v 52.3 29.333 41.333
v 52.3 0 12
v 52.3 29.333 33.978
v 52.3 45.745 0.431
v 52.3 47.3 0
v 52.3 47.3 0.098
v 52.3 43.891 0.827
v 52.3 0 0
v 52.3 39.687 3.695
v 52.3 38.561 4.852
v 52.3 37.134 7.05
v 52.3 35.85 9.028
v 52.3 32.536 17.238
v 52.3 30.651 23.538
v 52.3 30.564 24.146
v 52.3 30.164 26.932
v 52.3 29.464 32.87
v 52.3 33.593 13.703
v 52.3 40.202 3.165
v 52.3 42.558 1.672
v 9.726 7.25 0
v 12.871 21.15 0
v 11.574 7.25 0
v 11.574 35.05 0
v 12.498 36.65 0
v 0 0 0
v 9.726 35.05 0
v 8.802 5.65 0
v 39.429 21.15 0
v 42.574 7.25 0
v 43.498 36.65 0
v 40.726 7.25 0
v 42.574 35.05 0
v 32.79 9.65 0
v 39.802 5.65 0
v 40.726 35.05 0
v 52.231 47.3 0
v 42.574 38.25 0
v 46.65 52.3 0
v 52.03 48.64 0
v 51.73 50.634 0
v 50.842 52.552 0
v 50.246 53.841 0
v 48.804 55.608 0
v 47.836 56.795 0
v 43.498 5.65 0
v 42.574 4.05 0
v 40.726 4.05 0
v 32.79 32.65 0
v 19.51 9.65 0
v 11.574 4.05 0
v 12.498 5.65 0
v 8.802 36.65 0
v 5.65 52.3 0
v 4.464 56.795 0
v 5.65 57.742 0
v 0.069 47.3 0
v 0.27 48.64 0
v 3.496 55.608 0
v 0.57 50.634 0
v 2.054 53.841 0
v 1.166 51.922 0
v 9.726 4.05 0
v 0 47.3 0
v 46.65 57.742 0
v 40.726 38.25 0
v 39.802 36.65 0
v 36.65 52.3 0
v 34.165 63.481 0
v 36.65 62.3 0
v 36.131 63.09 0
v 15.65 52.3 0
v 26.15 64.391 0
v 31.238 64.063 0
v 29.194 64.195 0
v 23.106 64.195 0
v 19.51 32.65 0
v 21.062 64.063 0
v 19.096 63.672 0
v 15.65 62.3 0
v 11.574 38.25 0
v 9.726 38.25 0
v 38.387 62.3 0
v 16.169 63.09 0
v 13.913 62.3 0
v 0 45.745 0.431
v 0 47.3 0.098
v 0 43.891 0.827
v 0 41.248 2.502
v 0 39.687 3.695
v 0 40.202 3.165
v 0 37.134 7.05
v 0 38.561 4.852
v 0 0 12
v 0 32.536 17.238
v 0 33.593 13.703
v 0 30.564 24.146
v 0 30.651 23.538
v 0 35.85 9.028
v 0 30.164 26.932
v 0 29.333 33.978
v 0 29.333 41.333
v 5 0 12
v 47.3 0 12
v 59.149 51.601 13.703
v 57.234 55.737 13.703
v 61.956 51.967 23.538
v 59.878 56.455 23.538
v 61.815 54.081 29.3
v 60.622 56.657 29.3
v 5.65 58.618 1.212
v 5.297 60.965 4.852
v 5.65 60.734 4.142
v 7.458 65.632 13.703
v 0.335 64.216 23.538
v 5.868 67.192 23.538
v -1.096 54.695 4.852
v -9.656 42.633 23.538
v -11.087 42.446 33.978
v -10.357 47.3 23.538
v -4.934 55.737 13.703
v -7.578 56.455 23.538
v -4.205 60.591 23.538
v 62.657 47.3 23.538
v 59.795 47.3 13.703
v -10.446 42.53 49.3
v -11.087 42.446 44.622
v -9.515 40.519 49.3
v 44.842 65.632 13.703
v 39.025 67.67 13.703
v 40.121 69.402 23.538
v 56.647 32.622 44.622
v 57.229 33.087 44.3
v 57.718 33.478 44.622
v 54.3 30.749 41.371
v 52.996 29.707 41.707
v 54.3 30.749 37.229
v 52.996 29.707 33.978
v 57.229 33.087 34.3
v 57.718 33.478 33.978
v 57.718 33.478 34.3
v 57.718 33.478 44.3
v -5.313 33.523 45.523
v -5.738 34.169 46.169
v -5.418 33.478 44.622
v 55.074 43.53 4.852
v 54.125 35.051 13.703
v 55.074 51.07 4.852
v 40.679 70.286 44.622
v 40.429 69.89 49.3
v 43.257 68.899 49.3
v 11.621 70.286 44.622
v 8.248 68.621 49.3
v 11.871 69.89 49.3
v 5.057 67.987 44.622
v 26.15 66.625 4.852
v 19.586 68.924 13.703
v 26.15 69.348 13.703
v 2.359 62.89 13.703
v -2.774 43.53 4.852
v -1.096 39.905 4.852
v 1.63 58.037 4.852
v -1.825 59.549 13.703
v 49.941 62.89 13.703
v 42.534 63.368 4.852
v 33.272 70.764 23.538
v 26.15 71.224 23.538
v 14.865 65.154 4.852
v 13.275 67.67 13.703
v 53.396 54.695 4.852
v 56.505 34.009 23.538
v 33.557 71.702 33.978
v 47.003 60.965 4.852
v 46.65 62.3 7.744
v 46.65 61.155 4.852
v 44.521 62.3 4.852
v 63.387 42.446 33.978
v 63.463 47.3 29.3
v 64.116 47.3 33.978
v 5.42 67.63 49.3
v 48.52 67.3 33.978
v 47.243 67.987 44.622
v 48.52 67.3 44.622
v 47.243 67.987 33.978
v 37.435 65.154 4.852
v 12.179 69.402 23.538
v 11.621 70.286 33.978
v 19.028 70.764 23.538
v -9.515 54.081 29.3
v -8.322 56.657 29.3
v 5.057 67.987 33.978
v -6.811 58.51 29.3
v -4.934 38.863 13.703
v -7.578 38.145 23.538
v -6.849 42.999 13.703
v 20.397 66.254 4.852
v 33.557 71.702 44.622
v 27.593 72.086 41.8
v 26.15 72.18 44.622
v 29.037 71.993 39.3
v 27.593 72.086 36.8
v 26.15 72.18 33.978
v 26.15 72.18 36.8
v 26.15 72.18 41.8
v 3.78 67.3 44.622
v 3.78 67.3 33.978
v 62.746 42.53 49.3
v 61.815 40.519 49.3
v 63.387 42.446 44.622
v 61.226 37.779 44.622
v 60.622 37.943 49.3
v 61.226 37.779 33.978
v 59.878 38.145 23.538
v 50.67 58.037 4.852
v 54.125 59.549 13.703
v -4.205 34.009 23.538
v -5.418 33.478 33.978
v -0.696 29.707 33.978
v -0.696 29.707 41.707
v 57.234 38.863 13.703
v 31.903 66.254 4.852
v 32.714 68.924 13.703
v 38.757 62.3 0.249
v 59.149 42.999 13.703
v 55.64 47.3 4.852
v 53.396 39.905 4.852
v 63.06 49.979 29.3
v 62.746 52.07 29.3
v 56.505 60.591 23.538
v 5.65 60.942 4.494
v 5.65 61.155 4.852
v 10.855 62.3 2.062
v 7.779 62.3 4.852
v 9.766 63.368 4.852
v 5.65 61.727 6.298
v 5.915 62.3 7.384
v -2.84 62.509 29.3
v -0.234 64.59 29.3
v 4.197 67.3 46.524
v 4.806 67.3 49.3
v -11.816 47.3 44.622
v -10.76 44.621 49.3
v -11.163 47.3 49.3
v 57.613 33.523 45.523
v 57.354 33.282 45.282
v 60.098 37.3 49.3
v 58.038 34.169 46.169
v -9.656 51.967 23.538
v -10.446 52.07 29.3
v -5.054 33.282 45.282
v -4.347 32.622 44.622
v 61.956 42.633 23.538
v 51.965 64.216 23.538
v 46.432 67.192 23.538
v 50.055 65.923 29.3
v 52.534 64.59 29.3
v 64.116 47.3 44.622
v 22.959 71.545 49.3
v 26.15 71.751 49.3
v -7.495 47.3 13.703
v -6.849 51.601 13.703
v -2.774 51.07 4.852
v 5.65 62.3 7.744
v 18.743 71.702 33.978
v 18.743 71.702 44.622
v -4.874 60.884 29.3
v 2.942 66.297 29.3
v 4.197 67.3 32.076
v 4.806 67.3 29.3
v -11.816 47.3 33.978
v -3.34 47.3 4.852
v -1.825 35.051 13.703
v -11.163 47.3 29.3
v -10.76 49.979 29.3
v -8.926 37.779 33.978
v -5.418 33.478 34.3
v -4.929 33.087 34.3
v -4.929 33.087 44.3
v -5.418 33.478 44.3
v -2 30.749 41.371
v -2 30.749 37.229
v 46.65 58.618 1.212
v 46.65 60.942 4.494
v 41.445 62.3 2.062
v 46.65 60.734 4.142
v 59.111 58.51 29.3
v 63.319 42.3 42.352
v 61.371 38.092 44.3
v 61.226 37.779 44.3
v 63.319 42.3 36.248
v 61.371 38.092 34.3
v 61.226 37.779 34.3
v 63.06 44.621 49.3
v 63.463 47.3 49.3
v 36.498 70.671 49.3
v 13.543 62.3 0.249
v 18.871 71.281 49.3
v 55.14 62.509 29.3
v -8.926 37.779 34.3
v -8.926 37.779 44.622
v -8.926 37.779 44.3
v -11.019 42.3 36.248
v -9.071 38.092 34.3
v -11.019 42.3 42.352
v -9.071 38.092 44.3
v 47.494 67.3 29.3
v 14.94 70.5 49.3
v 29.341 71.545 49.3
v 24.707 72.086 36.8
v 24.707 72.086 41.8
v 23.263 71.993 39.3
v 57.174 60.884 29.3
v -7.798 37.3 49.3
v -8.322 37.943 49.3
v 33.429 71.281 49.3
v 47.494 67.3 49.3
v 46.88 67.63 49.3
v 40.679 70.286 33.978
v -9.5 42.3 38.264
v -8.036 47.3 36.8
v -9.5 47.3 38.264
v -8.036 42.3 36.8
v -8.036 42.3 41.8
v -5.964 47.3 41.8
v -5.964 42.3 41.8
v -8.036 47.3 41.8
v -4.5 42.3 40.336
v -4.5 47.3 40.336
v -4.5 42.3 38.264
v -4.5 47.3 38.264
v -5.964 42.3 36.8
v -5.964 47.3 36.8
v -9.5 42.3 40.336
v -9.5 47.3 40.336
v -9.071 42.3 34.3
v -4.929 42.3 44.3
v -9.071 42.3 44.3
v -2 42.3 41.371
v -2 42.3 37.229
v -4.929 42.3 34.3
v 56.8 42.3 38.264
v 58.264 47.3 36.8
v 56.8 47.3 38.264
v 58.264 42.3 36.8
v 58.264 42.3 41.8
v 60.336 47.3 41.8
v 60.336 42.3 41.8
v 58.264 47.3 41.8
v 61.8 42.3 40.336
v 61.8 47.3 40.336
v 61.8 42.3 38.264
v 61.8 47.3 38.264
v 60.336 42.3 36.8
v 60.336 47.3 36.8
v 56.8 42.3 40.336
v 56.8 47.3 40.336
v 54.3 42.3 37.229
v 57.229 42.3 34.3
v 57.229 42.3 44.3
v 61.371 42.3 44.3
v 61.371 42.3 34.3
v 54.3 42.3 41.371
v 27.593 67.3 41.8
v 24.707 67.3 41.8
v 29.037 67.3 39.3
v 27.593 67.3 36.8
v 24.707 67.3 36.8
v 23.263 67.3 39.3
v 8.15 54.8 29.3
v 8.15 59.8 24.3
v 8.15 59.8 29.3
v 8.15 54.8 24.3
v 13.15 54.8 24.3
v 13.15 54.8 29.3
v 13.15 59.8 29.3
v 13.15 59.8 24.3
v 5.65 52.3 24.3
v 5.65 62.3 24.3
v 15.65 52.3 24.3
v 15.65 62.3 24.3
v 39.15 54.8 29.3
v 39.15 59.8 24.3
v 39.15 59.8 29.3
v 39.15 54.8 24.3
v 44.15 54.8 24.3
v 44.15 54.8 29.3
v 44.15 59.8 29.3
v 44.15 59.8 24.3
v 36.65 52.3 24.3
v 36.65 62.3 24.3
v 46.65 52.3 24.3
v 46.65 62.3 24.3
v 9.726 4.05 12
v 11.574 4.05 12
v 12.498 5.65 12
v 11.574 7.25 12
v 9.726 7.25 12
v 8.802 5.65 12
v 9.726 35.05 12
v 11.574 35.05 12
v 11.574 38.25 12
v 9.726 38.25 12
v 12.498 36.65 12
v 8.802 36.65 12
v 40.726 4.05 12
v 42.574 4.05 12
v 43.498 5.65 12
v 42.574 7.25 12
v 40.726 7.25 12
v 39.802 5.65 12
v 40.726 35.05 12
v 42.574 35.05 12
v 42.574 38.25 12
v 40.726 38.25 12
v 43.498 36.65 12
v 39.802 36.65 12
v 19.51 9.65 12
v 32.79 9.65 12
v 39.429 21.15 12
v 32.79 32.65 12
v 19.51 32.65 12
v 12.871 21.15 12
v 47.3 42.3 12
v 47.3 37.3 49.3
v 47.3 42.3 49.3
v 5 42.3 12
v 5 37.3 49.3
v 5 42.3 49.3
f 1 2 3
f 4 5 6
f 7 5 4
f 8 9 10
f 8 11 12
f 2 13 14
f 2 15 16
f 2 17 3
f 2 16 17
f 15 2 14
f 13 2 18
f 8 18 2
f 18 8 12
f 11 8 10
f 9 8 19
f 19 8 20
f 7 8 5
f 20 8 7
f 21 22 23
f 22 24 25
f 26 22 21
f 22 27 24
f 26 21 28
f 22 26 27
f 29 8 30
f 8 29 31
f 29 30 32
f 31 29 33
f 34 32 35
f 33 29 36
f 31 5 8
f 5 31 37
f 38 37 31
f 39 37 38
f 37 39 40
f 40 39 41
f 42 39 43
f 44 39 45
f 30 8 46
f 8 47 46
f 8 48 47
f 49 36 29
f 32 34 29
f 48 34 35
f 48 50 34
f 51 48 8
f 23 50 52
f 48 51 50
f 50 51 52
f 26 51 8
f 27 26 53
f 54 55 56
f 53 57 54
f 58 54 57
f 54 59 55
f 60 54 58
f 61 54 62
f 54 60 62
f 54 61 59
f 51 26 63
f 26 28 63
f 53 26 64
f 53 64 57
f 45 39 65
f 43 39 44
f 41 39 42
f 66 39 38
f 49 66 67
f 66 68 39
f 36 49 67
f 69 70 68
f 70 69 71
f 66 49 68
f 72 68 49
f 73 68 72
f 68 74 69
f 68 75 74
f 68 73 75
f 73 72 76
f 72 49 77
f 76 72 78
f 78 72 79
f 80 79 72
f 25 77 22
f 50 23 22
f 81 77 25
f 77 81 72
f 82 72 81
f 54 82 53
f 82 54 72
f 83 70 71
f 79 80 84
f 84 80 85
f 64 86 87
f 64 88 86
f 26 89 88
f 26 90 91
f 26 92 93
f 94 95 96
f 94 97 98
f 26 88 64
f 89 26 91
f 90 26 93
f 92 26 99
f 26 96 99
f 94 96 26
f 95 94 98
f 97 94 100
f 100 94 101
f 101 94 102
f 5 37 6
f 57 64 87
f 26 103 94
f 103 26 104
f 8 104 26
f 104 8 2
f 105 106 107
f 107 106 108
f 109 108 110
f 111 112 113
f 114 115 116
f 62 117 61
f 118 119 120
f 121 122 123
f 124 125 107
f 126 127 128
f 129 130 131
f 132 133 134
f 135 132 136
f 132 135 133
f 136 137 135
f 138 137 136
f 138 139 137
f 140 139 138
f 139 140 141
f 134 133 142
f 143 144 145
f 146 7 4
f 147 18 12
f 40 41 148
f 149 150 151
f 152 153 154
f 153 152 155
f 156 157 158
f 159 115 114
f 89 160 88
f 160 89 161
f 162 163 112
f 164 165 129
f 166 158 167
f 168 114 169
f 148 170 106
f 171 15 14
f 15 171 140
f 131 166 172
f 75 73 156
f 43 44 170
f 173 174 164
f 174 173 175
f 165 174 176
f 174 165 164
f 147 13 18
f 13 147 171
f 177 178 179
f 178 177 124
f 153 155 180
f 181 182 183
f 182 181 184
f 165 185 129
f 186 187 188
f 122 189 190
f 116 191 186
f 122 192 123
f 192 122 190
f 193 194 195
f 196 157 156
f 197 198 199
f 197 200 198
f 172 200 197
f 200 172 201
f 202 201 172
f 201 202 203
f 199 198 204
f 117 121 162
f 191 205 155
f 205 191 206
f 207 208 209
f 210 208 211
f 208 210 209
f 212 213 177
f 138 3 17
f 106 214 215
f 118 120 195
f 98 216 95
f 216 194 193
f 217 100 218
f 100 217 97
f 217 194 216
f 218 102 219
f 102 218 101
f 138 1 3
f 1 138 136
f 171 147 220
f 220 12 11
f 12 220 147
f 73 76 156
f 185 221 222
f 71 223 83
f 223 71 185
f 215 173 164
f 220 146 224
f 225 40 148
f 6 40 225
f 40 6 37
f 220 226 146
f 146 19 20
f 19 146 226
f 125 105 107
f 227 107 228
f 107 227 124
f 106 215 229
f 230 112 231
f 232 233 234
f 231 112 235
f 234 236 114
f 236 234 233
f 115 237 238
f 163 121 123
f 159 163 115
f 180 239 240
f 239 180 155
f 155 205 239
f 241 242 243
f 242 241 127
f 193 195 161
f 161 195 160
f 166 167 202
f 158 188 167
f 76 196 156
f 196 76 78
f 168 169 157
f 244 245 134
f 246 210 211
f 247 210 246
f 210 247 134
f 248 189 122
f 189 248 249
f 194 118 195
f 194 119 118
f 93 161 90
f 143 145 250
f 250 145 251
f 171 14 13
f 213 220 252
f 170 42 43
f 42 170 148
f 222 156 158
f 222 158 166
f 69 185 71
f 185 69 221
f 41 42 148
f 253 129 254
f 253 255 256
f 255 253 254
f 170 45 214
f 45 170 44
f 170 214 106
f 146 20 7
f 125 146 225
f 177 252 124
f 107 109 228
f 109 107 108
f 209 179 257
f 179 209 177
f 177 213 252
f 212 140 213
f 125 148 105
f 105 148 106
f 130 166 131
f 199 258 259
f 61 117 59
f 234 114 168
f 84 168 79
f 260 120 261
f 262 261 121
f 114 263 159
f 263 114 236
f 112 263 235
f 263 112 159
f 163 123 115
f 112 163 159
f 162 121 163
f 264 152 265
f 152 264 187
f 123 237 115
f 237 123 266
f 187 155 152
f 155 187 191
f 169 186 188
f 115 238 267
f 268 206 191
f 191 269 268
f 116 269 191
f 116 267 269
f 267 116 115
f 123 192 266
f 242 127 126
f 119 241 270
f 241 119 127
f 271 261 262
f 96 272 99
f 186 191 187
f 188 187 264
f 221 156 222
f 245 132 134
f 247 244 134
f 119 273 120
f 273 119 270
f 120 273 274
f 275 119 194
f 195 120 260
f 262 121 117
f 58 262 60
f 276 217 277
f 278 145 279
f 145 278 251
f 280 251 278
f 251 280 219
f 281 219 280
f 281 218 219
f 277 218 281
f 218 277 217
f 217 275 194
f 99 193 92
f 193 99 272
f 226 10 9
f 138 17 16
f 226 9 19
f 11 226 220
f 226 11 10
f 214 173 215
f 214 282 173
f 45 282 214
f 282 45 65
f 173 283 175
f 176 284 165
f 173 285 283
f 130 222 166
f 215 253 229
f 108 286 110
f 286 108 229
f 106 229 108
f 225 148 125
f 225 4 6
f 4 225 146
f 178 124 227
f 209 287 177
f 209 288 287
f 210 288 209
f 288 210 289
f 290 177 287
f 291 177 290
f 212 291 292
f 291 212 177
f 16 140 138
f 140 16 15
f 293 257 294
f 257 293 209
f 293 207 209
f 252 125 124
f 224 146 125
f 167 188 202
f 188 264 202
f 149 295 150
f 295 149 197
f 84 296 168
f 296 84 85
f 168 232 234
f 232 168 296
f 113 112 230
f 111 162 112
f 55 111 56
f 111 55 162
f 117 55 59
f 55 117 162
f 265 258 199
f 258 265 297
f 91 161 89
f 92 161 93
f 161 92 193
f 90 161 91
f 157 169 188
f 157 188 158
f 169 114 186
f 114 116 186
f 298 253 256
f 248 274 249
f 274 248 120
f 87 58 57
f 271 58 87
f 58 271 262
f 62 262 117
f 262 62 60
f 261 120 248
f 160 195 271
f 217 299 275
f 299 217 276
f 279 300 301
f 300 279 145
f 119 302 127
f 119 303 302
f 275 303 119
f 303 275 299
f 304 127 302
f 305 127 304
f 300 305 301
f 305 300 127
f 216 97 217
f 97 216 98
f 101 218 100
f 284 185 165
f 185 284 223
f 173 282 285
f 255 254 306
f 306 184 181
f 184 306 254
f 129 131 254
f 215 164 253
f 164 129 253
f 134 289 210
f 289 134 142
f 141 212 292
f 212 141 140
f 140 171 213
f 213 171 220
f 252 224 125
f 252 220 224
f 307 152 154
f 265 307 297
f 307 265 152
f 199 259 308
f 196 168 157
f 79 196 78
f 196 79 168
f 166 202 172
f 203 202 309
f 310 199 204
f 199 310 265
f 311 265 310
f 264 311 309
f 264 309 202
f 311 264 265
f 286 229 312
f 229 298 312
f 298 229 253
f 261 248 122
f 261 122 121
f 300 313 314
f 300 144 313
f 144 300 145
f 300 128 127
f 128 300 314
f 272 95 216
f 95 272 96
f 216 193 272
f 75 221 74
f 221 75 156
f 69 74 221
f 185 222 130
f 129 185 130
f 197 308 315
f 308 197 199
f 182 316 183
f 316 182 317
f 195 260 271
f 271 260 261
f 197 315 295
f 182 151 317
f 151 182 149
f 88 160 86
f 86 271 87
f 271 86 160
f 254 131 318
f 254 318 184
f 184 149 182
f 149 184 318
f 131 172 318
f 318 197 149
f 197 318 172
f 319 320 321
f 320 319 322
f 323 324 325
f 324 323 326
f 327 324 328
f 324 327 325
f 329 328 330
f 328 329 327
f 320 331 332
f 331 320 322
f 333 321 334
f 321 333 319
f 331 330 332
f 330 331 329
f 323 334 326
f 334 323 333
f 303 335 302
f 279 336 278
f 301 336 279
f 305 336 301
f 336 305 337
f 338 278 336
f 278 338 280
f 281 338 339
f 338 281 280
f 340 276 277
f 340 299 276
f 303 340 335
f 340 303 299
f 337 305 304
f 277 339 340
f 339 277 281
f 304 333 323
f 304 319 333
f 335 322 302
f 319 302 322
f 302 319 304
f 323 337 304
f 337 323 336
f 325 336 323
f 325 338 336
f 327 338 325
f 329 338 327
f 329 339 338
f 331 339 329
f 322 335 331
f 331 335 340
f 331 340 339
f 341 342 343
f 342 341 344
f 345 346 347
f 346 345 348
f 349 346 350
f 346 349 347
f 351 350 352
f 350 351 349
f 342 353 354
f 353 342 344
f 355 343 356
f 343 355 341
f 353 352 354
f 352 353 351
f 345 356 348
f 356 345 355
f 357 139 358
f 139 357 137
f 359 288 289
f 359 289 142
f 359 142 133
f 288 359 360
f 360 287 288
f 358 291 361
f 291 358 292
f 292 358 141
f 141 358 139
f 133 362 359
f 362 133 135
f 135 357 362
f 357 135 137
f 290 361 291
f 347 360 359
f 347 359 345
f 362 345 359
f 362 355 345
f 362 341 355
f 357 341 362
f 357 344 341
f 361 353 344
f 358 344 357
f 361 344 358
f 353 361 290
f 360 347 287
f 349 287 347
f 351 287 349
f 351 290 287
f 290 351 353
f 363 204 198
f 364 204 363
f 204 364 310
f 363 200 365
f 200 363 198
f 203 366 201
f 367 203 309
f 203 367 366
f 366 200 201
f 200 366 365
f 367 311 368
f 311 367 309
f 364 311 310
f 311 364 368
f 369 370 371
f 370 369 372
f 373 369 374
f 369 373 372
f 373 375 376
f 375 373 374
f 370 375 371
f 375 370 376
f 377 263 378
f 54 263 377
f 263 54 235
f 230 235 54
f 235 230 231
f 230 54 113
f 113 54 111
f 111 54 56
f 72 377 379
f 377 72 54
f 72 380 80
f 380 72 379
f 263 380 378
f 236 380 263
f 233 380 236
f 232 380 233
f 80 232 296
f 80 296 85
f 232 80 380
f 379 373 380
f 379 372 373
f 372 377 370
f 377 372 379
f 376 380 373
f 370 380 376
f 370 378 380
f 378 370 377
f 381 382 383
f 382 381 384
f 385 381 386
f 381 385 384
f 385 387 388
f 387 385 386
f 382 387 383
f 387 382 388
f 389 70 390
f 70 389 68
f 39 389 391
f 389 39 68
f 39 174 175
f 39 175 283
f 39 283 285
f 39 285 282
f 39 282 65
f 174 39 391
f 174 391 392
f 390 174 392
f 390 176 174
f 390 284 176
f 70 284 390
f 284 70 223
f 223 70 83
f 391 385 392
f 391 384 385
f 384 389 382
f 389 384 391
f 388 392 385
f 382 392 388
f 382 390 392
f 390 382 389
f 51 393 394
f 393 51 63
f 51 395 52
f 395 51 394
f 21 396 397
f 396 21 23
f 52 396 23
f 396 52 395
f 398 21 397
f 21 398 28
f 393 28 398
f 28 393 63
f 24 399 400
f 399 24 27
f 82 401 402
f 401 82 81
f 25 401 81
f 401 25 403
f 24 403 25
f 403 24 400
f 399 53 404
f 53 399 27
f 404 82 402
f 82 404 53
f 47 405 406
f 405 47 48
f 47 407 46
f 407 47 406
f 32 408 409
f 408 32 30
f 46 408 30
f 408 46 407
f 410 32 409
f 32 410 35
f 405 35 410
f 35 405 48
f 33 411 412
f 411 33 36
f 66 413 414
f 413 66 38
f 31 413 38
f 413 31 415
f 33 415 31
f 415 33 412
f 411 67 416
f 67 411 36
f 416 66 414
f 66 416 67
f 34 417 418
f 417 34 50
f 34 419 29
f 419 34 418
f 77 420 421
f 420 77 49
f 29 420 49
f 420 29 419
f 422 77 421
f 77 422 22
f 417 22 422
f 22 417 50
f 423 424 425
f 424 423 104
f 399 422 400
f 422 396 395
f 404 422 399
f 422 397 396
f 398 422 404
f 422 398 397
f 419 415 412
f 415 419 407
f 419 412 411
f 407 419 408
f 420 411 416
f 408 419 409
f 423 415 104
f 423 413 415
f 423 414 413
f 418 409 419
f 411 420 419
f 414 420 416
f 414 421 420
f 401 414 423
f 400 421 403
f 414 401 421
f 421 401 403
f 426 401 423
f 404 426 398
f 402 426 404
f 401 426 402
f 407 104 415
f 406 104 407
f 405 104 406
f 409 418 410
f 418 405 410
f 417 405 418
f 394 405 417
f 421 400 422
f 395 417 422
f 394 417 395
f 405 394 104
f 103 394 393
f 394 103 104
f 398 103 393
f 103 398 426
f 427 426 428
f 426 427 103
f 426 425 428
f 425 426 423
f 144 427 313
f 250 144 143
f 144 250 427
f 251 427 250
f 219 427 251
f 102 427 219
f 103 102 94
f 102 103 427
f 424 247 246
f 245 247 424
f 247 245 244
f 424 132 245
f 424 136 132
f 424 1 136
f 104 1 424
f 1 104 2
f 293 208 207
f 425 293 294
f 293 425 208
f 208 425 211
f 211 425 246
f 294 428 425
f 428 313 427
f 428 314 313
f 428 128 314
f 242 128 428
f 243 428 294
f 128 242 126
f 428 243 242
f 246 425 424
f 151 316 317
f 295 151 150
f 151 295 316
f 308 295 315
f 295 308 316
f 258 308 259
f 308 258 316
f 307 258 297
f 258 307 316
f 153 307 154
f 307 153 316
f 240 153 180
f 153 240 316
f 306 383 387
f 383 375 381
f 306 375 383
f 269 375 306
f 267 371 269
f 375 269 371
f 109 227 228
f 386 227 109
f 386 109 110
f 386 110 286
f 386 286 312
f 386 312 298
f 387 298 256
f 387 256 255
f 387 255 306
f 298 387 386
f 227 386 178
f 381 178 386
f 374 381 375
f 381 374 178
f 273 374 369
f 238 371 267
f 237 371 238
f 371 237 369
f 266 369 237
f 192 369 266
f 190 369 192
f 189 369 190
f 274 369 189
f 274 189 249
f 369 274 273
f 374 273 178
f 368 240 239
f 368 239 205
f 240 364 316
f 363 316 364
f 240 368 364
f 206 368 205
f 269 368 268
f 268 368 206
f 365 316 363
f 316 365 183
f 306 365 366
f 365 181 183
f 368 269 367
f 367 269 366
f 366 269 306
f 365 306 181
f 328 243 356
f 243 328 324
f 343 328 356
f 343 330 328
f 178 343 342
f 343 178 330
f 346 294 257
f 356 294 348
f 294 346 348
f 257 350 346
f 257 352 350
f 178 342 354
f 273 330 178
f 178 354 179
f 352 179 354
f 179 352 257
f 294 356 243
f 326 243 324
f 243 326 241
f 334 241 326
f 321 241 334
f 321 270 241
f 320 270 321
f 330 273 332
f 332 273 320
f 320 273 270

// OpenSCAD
// file: vars.scad
// Variables used throughout design.
// Yes, these could use some commenting.
// (c) 2014, Christopher "ScribbleJ" Jansen

// Printer outside dimensions are actually this + corner_thick*2.
printer_w = 400;
printer_l = 400;
printer_h = 400;

// Used wherever I need something arbitrarily large.
huge=500;

// 608 Bearings
//Added some extra space to the bearing retainer so I don't break them during assembly
bearing_w = 7*1.01;  
bearing_d = 22*1.01;
bearing_r = bearing_d/2;
bearing_hole_d = 8;
bearing_hole_r = bearing_hole_d/2;

// Miscellaneous bolts, M3
misc_bolt_d = 3.2;
misc_bolt_r = misc_bolt_d/2;
misc_nut_r  = misc_bolt_d;
misc_bolt_pitch = 0.5;
misc_bolthead_d = misc_bolt_d*2;
misc_bolthead_r = misc_bolthead_d/2;

//Retainer for using a regular bolt (M8) instead of a proper leadscrew as the Z lift nut.
liftNut_d = 8;
liftNut_od = liftNut_d *2;
liftNut_h = liftNut_d * 0.8;
liftNutRetainer_h = liftNut_h ;

// Bearing retainers
//Added some extra thickness to the bearing retainer so I don't break them during assembly
retainer_shell_thick = 0.6;
retainer_shell_sep   = 0.25;
retainer_lip_thick   = 2;
retainer_inner_width = 1;

// GT2, 2mm belting
belt_w    = 6;
belt_thick= 2;
belt_sep  = retainer_lip_thick*2 + 2;

// Some calculated info about the bearing retainers.
calc_retainer_h  = retainer_lip_thick*2 + belt_w;
calc_retainer_ir = bearing_r + retainer_shell_thick*2 + retainer_shell_sep;
calc_retainer_or = calc_retainer_ir + belt_thick;
calc_retainer_b_off = retainer_lip_thick - (bearing_w-belt_w)/2;

// 20mm Tslot and associated bolt dimensions
tslot_w = 20;
tslot_bolt_d = 5;
tslot_bolt_r = tslot_bolt_d/2;
tslot_bolt_l = 4;
tslot_bolthead_d = 10;
tslot_bolthead_r = tslot_bolthead_d/2;

// This variable is called corner_thick, but it's used pretty much everywhere something needs to be sturdy but thin, not
// just on the corners.
// TODO: Anywhere it's used that's not a corner, I should make a new variable for that thing.
corner_thick = 5;
corner_length = tslot_w*3;

// 8mm Smooth Rod dimensions
rod_d=8;
rod_r=rod_d/2;

// Named because they were originally bronze bushings, now expects to be LM8UU.
bushing_d=15;
bushing_r=bushing_d/2;
bushing_l=10;
bushing_flange_r = bushing_r+3;
bushing_flange_w = 1;
bushing_material_thick = 5;

// X Axis dimensions
x_rod_sep = 50;
x_carriage_l = 50;
x_mount_sep_x = x_carriage_l - misc_bolthead_r*2*2 - misc_bolt_r*2;
x_mount_offset = bushing_r + misc_bolt_r * 2;
belt_above_x = bushing_r+misc_nut_r*2;
belt_clamp_w = 7;
x_rod_past_bearing = 20;

// Y Axis dimensions
belt_above_y = 45;
y_above_x = belt_above_x-belt_above_y;


// The standoffs for the belt idler bearings.
bearing_mount_base = corner_thick;
bearing_mount_extra = 2;
belt_above_bearing_mount = bearing_mount_base + bearing_mount_extra + retainer_lip_thick;
bearing_mount_support_tweak = 30;
y_bearing_offset = bushing_r+bushing_material_thick-calc_retainer_ir;
y_bearing_sep_y = calc_retainer_ir*2+belt_thick;
y_bearing_sep_z = belt_w+belt_sep;
bearing_bolt_r  = 4;
bearing_bolt_pitch = 1.25;
bearing_bolt_holder_thick = 4;

// Gap between Y carriage and T-slot
y_carriage_from_tslot = 2;

// 50mm Y-carriage length fits 2 LM8UU
y_carriage_len = 50;

// NEMA17 Motor Dimensions
motor_w = 42.3;
motor_h = motor_w;
motor_bolt_sep = 31.0;
motor_bolt_r   = 1.5;
// Dimensions of pulleys on X/Y Motors
motor_pulley_d = 10;
motor_pulley_r = motor_pulley_d/2;
motor_pulley_h = 5.3;  // This is the distance the pulley is above the motor body, not the height of the pulley itself.
motor_flange_d = 23;
motor_flange_r = motor_flange_d/2;
// This creates an extra hole in the motor corner for T-slot mounting, because the spaces for the motor mounts may coincide 
// with one of the standard holes.
motor_corner_extra_hole_pos = tslot_bolt_r+3;

// Some useful precalculated values
calc_corner_from_y_rod = x_rod_past_bearing+corner_thick+y_carriage_from_tslot+tslot_w;
calc_corner_above_x = belt_above_x - belt_above_bearing_mount + bearing_mount_base;
calc_motor1_above_x  = belt_above_x - motor_pulley_h;
calc_motor2_above_x  = belt_above_x - motor_pulley_h + belt_w + belt_sep;
calc_motor_from_y_rod = -bushing_r - bushing_material_thick + bearing_bolt_holder_thick + bearing_bolt_r + calc_retainer_or + motor_pulley_r;

// Motor bracket thick is 12 because I'm using M3x16 to mount the motors and the bolts can fit about 4mm into a NEMA17.
motor_bracket_thick = 12;
motor_bracket_wide = (motor_w - motor_flange_d) / 2;
motor_bracket_len  = motor_w;
motor_bolt_offset  = (motor_w - motor_bolt_sep) / 2;

// How far apart the Z smooth rods should be
z_rod_sep = 150;
z_motor_off = motor_h - tslot_w - corner_thick;

// Very important to set this for your lasercut Z, the thickness of the material you are lasering.
laser_mat_thick = 4.75;
// Laser mat margin is how much material is required outside of a tabslot.
laser_mat_margin = laser_mat_thick;
// Distance between heated bed holes, 209 is standard for a reprap heated bed
bed_mount_sep   = 209;
// Bed mounting holes will be created centered on the Z platform, and another set offset at this distance from the smooth rod:
bed_from_z      = 60;
// bed_box_r and bed_box_h here will exactly fir the lm8uu holders.  Decrease at your own peril.
bed_box_r       = 25;
bed_box_h       = 50;
z_ends_sep = printer_l - tslot_w*2 - corner_thick*2 - motor_w;
platform_l      =  laser_mat_margin*2 + laser_mat_thick*2 + bed_box_r*2 + z_ends_sep;
platform_w      = bed_mount_sep + misc_bolt_r*2 + laser_mat_margin*2;
// These settings for the leadscrew fit the leadscrews sold by MakersToolWorks
z_leadscrew_passthrough_r = 12/2;
leadscrew_bolt_offset = 22/2;
leadscrew_bolt_r = 3.2/2;
laser_bushing_fudge = 0.1; // No longer used since the change to lm8uu


// LM8UU bearing dimensions
lm8uu_d=15;
lm8uu_r=lm8uu_d/2;
lm8uu_l=24;
// The nut and bolt here refer to the ones used in the Z axis' four LM8UU holders.
lm8uu_bolt_r=5/2;
lm8uu_nut_r=10/2;

arduino_width=60;
// file: common.scad
// Common functions used in various places throughout.
// (c) 2014, Christopher "ScribbleJ" Jansen
include <vars.scad>

// Reduce radius of holes intended to hold bolts by threads.
// 0.86603 * p = nominal depth of threads.  1/3-1/2 of that is about right.
function smallhole(r,p) = r - ((p*0.86603)/3);

// Polyhole derived from Nophead's Polyhole work: http://hydraraptor.blogspot.com/2011/02/polyholes.html
module polyhole(r,h,v=6,a=0)
{
  rotate([0,0,a]) cylinder( h = h, r = r  / cos( 180 / v ), $fn = v );
}
// 2D version of Polyhole
module polycircle(r,v=6,a=0)
{
  rotate([0,0,a]) circle(r = r  / cos( 180 / v ), $fn = v );
}
// Cutout for bolthole
module bolt(bolt_r = misc_bolt_r,bolthead_r = misc_bolthead_r,bolt_len = huge,v=6,a=0)
{
  translate([0,0,-bolt_len]) polyhole(r=bolt_r,h=bolt_len+1,v=v,a=a);
  polyhole(r=bolthead_r,h=huge,v=v,a=a);
}
// 2D ring
module ring(inner=5,outer=10,v=32)
{
  difference()
  {
    circle(r=outer);
    polycircle(r=inner,v=v);
  }
} 
// 2D Rounded square
module roundsquare(dim=[50,50],r=5)
{
  translate([0,r]) square([dim[0], dim[1] - r*2]);
  translate([r,0]) square([dim[0] - r*2, dim[1]]);
  for(x=[r,dim[0]-r])
  for(y=[r,dim[1]-r])
    translate([x,y]) circle(r=r);
}
// Lasercutting Tabs
module maketabs(l=100,w=5,num=10)
{
  tablength=l/(num * 2);
  for(x=[tablength/2:tablength*2:l])
    translate([x,0]) square([tablength,w]);
}
// Support for printing bearing mount
module support(l=bearing_mount_base+bearing_mount_extra+y_bearing_sep_z+calc_retainer_b_off,w=bearing_hole_d * tan(180/6) *2,extra=0,extra_l=0)
{
  translate([-w/2,0,-l]) 
  {
    difference()
    {
      rotate([45,0,0]) cube([w,huge/2,huge/2]);
      translate([-huge/2,0,0]) cube([huge,huge,huge]);
      translate([-huge/2,-huge/2,l]) cube([huge,huge,huge]);
    }
    translate([0,-extra,-extra_l/2]) cube([w,extra,extra_l]);
  }

}
// main file
// Z motor mount
// Print 2
// (c) 2014, Christopher "ScribbleJ" Jansen
include <common.scad>
use <platform.scad>


z_motor_mount();

module z_motor_mount()
{

  difference()
  {
    union()
    {
      // Basic Bracket
      cube([motor_w + corner_thick*2, motor_w+corner_thick, motor_h+motor_bracket_thick]);
      // ORB
      translate([motor_w/2+corner_thick,motor_w+corner_thick,motor_h+motor_bracket_thick-tslot_w/2-corner_thick]) scale([motor_w+corner_thick*2+tslot_bolthead_r*4+4,(tslot_w+corner_thick)*2,(motor_h+motor_bracket_thick)*2]) sphere(r=.5,$fn=32);
    }

    // Motor Cutout
    translate([corner_thick,-1,motor_bracket_thick]) cube([motor_w,motor_w+1,motor_h+1]);
    // Angle
    translate([-huge/2,0,motor_bracket_thick]) rotate([45,0,0]) cube([huge,huge,huge]);

    // T-slot bolt holes
    // front
    translate([-tslot_bolthead_r-2,motor_w,motor_h+motor_bracket_thick-corner_thick-tslot_w/2])rotate([90,0,0]) bolt(bolt_r=tslot_bolt_r,bolthead_r=tslot_bolthead_r,v=8,a=360/16); 
    translate([motor_w+corner_thick*2+tslot_bolthead_r+2,motor_w,motor_h+motor_bracket_thick-corner_thick-tslot_w/2])rotate([90,0,0]) bolt(bolt_r=tslot_bolt_r,bolthead_r=tslot_bolthead_r,v=8,a=360/16); 
    // back
    translate([motor_w/2+corner_thick,motor_w+corner_thick*2+tslot_w,motor_h+motor_bracket_thick-corner_thick-tslot_w/2]) rotate([-90,0,0]) bolt(bolt_r=tslot_bolt_r,bolthead_r=tslot_bolthead_r,bolt_len=10); 
    // top
    translate([motor_w/2+corner_thick-motor_bolt_sep/2,motor_w+corner_thick+tslot_w/2,motor_h+motor_bracket_thick-corner_thick*2-tslot_w]) rotate([180,0,0]) bolt(bolt_r=tslot_bolt_r,bolthead_r=tslot_bolthead_r,v=4,a=360/8);
    translate([motor_w/2+corner_thick+motor_bolt_sep/2,motor_w+corner_thick+tslot_w/2,motor_h+motor_bracket_thick-corner_thick*2-tslot_w]) rotate([180,0,0]) bolt(bolt_r=tslot_bolt_r,bolthead_r=tslot_bolthead_r,v=4,a=360/8);

    // motor shaft and bolt holes
    translate([corner_thick + motor_w/2,motor_w/2,-1])
    {
      polyhole(r=motor_flange_r,h=huge);
      for(x=[-motor_bolt_sep/2,motor_bolt_sep/2])
      for(y=[-motor_bolt_sep/2,motor_bolt_sep/2])
      {
        translate([x,y,0]) polyhole(r=misc_bolt_r,h=huge);
      }
    }

    // ORB cuts
    translate([-huge/2,-huge/2,-huge]) cube([huge,huge,huge]);
    translate([-huge/2,-huge/2,motor_bracket_thick+motor_h-corner_thick]) cube([huge,huge,huge]);

    translate([-huge/2,motor_w+corner_thick,motor_h+motor_bracket_thick-tslot_w-corner_thick]) cube([huge,tslot_w,tslot_w]);
  }
}
